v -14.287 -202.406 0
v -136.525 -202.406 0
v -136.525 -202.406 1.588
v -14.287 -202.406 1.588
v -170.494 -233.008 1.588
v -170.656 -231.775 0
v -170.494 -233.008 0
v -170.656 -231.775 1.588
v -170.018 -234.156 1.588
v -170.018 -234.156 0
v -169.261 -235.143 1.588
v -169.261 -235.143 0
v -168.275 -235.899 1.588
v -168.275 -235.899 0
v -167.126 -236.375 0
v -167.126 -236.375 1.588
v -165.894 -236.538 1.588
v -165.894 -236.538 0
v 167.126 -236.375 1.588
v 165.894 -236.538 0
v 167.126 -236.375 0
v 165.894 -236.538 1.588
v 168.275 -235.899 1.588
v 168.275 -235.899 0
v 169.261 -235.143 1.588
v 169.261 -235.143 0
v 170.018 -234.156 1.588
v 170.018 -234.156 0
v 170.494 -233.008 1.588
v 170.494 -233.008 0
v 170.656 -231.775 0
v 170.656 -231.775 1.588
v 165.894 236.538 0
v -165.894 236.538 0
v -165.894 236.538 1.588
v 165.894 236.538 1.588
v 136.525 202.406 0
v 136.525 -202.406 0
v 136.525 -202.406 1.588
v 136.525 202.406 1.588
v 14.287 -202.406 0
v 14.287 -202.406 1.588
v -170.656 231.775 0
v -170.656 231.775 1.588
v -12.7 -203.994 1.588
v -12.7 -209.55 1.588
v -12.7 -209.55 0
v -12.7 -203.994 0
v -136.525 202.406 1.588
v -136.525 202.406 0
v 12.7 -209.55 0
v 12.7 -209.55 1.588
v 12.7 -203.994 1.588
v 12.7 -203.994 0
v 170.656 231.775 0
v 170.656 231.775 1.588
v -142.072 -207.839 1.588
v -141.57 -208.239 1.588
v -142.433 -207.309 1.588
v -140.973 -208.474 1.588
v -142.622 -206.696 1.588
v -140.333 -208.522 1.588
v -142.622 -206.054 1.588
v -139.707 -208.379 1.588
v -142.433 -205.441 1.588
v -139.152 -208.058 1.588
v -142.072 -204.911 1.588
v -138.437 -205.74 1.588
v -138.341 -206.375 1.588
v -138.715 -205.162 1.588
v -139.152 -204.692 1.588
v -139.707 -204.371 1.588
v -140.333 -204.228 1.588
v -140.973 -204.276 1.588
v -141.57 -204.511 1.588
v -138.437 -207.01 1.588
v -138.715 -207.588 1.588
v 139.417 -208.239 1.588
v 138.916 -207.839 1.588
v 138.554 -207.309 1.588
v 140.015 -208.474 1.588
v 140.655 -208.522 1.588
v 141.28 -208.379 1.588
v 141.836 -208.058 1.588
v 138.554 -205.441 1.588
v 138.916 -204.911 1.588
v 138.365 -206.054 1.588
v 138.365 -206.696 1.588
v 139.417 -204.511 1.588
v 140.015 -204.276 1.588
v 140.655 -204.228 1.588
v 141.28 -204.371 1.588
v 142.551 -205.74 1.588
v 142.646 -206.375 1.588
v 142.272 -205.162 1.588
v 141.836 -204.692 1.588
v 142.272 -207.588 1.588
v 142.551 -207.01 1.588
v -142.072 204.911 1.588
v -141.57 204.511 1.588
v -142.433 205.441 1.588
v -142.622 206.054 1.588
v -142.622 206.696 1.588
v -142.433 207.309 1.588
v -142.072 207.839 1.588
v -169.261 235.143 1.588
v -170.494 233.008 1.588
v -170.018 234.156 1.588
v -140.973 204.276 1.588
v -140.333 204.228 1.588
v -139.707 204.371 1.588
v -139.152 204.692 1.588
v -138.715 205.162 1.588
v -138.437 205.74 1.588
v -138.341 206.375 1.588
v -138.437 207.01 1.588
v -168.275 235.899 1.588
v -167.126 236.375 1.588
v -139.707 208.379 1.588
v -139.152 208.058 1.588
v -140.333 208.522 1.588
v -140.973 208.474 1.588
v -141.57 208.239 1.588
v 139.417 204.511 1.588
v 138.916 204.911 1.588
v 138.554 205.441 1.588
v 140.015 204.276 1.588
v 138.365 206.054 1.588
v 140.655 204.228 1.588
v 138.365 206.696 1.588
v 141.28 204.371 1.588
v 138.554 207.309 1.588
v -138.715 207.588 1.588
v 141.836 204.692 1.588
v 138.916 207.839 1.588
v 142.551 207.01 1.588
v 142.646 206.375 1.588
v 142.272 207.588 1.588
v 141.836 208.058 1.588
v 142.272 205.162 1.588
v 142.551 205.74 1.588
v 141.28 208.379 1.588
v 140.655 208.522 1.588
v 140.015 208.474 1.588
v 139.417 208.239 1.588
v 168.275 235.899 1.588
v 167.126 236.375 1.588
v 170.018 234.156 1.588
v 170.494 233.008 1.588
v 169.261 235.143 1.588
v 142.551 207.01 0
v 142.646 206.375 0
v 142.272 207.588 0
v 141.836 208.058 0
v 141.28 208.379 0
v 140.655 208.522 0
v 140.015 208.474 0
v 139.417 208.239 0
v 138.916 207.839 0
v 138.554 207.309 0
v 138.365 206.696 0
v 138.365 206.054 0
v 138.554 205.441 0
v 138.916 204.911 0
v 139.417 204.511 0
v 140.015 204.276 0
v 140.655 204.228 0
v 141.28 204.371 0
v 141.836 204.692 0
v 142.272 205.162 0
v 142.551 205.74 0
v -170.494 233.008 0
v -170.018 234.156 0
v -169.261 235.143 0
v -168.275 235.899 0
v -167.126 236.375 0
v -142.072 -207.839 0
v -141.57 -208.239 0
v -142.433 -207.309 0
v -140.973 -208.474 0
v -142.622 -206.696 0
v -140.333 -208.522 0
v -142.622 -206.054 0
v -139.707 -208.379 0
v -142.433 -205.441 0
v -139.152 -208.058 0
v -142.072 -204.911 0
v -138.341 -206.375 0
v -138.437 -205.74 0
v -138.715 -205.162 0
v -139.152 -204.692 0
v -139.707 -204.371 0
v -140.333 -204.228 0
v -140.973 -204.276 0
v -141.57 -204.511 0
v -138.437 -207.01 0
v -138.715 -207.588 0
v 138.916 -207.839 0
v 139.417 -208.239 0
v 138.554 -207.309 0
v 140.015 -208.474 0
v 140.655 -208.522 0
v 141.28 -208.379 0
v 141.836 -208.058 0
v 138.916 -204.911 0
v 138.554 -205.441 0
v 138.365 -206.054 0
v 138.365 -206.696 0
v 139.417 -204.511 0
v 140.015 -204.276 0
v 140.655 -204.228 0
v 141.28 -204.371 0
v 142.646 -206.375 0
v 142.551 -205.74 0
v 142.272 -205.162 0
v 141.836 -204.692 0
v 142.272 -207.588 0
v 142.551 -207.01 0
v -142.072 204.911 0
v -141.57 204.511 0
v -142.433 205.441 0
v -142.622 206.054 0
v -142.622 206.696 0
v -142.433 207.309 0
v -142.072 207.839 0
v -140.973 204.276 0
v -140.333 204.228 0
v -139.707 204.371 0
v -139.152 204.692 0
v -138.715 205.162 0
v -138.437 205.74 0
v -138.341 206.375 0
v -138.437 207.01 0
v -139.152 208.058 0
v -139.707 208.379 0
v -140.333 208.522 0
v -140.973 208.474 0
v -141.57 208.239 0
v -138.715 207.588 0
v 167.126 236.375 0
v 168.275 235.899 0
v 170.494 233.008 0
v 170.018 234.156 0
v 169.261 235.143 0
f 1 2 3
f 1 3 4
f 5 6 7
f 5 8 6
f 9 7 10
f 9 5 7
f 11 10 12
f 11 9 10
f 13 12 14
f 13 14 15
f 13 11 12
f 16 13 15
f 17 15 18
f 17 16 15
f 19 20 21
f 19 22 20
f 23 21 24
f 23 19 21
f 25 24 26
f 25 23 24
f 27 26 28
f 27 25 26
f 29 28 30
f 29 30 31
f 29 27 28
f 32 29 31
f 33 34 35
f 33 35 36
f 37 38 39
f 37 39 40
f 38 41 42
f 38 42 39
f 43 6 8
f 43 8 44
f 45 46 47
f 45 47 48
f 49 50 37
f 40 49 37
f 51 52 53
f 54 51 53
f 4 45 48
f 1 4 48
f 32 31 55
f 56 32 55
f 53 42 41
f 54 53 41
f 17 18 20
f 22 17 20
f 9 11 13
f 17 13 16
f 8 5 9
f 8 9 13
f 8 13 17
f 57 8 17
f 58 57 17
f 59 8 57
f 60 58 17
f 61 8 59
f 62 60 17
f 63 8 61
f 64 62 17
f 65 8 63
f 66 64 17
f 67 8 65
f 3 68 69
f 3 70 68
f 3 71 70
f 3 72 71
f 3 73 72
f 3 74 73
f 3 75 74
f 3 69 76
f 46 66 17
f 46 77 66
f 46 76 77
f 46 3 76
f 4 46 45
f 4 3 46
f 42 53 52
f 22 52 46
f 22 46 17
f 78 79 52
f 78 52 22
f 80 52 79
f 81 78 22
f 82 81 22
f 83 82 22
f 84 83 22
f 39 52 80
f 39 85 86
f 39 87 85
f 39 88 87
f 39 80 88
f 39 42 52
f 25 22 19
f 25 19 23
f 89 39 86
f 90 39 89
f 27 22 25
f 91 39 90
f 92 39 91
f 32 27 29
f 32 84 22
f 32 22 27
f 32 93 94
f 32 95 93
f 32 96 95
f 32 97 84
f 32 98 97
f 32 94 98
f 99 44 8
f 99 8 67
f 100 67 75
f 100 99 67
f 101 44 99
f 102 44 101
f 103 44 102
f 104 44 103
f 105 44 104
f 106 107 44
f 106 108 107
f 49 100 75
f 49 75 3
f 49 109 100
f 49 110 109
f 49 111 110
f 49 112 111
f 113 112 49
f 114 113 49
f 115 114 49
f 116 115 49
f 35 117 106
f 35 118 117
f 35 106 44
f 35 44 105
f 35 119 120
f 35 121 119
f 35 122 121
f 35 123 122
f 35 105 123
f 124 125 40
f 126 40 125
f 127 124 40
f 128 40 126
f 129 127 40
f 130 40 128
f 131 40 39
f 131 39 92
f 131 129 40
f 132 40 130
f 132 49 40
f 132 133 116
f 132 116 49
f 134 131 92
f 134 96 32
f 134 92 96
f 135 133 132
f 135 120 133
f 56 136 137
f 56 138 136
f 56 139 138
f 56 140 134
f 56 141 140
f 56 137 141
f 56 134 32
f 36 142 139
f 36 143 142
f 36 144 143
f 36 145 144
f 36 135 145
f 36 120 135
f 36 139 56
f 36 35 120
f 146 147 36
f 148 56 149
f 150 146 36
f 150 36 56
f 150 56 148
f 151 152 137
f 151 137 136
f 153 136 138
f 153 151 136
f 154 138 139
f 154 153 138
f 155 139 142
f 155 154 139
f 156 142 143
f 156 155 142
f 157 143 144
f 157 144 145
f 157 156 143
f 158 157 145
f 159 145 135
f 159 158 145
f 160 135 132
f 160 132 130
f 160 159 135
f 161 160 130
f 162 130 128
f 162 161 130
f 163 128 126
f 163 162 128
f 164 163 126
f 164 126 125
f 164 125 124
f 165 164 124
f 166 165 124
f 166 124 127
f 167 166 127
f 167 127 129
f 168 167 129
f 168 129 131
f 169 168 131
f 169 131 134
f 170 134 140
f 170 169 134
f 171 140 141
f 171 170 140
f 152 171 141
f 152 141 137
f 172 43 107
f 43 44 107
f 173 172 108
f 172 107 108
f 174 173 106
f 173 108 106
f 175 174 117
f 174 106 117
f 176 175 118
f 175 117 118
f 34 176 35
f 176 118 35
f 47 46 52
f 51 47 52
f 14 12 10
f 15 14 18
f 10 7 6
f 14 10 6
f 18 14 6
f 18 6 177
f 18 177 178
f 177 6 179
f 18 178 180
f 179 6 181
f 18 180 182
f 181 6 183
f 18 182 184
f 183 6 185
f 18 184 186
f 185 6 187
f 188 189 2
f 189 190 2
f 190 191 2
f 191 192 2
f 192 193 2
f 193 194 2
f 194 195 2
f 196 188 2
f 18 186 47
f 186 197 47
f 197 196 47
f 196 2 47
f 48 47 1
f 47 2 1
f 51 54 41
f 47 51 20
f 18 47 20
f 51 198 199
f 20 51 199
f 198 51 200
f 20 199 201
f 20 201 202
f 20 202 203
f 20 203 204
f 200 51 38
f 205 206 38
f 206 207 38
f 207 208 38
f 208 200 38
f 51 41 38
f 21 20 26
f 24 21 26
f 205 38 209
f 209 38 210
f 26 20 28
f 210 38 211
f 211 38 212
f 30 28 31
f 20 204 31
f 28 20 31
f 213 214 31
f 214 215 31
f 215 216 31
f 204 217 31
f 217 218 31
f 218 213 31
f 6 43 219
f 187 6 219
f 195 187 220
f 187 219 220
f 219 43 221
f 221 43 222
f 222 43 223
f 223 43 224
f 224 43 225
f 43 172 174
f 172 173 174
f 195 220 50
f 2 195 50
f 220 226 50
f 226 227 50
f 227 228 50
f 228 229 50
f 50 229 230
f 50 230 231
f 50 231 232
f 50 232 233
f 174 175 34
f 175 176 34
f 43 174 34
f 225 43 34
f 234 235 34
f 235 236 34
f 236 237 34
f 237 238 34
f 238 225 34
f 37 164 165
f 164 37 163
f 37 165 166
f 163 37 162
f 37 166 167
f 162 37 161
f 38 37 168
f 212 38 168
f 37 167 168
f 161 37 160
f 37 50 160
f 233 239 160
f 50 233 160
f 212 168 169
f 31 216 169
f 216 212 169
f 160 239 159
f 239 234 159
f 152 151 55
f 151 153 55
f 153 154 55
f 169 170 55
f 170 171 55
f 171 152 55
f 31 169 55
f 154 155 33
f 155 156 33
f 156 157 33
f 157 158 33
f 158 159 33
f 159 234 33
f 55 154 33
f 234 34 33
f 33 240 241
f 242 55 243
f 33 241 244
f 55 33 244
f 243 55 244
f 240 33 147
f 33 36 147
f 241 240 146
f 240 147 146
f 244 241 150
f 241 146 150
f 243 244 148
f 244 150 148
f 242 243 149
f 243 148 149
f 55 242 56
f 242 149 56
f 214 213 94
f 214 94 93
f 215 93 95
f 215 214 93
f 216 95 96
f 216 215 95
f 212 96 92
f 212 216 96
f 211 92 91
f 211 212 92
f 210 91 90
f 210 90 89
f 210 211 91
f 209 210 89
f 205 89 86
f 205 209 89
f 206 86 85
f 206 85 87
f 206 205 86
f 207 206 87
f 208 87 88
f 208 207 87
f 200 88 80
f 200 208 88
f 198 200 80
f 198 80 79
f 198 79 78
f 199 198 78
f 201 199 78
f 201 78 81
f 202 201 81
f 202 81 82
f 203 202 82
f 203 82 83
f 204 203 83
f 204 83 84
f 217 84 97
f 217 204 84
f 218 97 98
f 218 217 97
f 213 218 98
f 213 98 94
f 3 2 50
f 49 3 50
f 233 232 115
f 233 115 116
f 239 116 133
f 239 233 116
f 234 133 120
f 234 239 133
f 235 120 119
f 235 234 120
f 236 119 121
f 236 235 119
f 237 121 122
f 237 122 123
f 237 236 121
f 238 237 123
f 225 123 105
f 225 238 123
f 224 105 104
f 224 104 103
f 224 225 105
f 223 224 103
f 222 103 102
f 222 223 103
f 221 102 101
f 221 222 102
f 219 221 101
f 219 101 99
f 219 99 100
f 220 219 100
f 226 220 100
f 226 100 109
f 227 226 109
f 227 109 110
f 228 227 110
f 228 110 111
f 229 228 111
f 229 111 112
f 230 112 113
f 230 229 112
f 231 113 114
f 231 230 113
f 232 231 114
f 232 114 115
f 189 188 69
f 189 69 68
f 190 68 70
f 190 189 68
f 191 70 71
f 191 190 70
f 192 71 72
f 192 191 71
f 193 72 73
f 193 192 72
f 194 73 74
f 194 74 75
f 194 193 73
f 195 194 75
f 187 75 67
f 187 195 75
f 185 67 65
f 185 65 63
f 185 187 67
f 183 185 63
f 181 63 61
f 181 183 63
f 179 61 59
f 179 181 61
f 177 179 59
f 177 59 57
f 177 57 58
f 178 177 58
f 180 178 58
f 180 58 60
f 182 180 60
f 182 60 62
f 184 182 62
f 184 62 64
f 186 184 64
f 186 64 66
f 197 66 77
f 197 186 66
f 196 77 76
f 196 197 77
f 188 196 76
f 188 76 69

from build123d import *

# Parameters (mm, degrees)
F0_W     = 341.3125
F0_H     = 473.075
F0_R     = 2.15265
F0_W_2   = 273.05
F0_H_2   = 404.8125
F1_DEPTH = 1.5875
F2_R     = 4.7625
F3_W     = 25.4
F3_H     = 7.14375
F4_DEPTH = 1.5875
F5_SIZE  = 1.5875


with BuildPart() as f1:
    # F0 (on Top) → F1 (new body)
    with BuildSketch(Plane.XY):
        Rectangle(F0_W, F0_H)
        with Locations((-140.49375, -206.375)):
            Circle(F0_R, mode=Mode.SUBTRACT)
        with Locations((140.49375, -206.375)):
            Circle(F0_R, mode=Mode.SUBTRACT)
        Rectangle(F0_W_2, F0_H_2, mode=Mode.SUBTRACT)
        with Locations((-140.49375, 206.375)):
            Circle(F0_R, mode=Mode.SUBTRACT)
        with Locations((140.49375, 206.375)):
            Circle(F0_R, mode=Mode.SUBTRACT)
    extrude(amount=F1_DEPTH)

    # F2
    f2_edges = [f1.edges().sort_by_distance(p)[0] for p in [
        (-170.65625, 236.5375, 0.79375),
        (170.65625, 236.5375, 0.79375),
        (170.65625, -236.5375, 0.79375),
        (-170.65625, -236.5375, 0.79375),
    ]]
    fillet(f2_edges, radius=F2_R)

    # F3 (on face) → F4 (cut, through all)
    with BuildSketch(Plane.XY.offset(1.5875)):
        with Locations((0, -205.978125)):
            Rectangle(F3_W, F3_H)
    extrude(amount=-F4_DEPTH, mode=Mode.SUBTRACT)

    # F5
    f5_edges = [f1.edges().sort_by_distance(p)[0] for p in [
        (12.7, -202.40625, 0.79375),
        (-12.7, -202.40625, 0.79375),
    ]]
    chamfer(f5_edges, length=F5_SIZE)


solid = f1.part
